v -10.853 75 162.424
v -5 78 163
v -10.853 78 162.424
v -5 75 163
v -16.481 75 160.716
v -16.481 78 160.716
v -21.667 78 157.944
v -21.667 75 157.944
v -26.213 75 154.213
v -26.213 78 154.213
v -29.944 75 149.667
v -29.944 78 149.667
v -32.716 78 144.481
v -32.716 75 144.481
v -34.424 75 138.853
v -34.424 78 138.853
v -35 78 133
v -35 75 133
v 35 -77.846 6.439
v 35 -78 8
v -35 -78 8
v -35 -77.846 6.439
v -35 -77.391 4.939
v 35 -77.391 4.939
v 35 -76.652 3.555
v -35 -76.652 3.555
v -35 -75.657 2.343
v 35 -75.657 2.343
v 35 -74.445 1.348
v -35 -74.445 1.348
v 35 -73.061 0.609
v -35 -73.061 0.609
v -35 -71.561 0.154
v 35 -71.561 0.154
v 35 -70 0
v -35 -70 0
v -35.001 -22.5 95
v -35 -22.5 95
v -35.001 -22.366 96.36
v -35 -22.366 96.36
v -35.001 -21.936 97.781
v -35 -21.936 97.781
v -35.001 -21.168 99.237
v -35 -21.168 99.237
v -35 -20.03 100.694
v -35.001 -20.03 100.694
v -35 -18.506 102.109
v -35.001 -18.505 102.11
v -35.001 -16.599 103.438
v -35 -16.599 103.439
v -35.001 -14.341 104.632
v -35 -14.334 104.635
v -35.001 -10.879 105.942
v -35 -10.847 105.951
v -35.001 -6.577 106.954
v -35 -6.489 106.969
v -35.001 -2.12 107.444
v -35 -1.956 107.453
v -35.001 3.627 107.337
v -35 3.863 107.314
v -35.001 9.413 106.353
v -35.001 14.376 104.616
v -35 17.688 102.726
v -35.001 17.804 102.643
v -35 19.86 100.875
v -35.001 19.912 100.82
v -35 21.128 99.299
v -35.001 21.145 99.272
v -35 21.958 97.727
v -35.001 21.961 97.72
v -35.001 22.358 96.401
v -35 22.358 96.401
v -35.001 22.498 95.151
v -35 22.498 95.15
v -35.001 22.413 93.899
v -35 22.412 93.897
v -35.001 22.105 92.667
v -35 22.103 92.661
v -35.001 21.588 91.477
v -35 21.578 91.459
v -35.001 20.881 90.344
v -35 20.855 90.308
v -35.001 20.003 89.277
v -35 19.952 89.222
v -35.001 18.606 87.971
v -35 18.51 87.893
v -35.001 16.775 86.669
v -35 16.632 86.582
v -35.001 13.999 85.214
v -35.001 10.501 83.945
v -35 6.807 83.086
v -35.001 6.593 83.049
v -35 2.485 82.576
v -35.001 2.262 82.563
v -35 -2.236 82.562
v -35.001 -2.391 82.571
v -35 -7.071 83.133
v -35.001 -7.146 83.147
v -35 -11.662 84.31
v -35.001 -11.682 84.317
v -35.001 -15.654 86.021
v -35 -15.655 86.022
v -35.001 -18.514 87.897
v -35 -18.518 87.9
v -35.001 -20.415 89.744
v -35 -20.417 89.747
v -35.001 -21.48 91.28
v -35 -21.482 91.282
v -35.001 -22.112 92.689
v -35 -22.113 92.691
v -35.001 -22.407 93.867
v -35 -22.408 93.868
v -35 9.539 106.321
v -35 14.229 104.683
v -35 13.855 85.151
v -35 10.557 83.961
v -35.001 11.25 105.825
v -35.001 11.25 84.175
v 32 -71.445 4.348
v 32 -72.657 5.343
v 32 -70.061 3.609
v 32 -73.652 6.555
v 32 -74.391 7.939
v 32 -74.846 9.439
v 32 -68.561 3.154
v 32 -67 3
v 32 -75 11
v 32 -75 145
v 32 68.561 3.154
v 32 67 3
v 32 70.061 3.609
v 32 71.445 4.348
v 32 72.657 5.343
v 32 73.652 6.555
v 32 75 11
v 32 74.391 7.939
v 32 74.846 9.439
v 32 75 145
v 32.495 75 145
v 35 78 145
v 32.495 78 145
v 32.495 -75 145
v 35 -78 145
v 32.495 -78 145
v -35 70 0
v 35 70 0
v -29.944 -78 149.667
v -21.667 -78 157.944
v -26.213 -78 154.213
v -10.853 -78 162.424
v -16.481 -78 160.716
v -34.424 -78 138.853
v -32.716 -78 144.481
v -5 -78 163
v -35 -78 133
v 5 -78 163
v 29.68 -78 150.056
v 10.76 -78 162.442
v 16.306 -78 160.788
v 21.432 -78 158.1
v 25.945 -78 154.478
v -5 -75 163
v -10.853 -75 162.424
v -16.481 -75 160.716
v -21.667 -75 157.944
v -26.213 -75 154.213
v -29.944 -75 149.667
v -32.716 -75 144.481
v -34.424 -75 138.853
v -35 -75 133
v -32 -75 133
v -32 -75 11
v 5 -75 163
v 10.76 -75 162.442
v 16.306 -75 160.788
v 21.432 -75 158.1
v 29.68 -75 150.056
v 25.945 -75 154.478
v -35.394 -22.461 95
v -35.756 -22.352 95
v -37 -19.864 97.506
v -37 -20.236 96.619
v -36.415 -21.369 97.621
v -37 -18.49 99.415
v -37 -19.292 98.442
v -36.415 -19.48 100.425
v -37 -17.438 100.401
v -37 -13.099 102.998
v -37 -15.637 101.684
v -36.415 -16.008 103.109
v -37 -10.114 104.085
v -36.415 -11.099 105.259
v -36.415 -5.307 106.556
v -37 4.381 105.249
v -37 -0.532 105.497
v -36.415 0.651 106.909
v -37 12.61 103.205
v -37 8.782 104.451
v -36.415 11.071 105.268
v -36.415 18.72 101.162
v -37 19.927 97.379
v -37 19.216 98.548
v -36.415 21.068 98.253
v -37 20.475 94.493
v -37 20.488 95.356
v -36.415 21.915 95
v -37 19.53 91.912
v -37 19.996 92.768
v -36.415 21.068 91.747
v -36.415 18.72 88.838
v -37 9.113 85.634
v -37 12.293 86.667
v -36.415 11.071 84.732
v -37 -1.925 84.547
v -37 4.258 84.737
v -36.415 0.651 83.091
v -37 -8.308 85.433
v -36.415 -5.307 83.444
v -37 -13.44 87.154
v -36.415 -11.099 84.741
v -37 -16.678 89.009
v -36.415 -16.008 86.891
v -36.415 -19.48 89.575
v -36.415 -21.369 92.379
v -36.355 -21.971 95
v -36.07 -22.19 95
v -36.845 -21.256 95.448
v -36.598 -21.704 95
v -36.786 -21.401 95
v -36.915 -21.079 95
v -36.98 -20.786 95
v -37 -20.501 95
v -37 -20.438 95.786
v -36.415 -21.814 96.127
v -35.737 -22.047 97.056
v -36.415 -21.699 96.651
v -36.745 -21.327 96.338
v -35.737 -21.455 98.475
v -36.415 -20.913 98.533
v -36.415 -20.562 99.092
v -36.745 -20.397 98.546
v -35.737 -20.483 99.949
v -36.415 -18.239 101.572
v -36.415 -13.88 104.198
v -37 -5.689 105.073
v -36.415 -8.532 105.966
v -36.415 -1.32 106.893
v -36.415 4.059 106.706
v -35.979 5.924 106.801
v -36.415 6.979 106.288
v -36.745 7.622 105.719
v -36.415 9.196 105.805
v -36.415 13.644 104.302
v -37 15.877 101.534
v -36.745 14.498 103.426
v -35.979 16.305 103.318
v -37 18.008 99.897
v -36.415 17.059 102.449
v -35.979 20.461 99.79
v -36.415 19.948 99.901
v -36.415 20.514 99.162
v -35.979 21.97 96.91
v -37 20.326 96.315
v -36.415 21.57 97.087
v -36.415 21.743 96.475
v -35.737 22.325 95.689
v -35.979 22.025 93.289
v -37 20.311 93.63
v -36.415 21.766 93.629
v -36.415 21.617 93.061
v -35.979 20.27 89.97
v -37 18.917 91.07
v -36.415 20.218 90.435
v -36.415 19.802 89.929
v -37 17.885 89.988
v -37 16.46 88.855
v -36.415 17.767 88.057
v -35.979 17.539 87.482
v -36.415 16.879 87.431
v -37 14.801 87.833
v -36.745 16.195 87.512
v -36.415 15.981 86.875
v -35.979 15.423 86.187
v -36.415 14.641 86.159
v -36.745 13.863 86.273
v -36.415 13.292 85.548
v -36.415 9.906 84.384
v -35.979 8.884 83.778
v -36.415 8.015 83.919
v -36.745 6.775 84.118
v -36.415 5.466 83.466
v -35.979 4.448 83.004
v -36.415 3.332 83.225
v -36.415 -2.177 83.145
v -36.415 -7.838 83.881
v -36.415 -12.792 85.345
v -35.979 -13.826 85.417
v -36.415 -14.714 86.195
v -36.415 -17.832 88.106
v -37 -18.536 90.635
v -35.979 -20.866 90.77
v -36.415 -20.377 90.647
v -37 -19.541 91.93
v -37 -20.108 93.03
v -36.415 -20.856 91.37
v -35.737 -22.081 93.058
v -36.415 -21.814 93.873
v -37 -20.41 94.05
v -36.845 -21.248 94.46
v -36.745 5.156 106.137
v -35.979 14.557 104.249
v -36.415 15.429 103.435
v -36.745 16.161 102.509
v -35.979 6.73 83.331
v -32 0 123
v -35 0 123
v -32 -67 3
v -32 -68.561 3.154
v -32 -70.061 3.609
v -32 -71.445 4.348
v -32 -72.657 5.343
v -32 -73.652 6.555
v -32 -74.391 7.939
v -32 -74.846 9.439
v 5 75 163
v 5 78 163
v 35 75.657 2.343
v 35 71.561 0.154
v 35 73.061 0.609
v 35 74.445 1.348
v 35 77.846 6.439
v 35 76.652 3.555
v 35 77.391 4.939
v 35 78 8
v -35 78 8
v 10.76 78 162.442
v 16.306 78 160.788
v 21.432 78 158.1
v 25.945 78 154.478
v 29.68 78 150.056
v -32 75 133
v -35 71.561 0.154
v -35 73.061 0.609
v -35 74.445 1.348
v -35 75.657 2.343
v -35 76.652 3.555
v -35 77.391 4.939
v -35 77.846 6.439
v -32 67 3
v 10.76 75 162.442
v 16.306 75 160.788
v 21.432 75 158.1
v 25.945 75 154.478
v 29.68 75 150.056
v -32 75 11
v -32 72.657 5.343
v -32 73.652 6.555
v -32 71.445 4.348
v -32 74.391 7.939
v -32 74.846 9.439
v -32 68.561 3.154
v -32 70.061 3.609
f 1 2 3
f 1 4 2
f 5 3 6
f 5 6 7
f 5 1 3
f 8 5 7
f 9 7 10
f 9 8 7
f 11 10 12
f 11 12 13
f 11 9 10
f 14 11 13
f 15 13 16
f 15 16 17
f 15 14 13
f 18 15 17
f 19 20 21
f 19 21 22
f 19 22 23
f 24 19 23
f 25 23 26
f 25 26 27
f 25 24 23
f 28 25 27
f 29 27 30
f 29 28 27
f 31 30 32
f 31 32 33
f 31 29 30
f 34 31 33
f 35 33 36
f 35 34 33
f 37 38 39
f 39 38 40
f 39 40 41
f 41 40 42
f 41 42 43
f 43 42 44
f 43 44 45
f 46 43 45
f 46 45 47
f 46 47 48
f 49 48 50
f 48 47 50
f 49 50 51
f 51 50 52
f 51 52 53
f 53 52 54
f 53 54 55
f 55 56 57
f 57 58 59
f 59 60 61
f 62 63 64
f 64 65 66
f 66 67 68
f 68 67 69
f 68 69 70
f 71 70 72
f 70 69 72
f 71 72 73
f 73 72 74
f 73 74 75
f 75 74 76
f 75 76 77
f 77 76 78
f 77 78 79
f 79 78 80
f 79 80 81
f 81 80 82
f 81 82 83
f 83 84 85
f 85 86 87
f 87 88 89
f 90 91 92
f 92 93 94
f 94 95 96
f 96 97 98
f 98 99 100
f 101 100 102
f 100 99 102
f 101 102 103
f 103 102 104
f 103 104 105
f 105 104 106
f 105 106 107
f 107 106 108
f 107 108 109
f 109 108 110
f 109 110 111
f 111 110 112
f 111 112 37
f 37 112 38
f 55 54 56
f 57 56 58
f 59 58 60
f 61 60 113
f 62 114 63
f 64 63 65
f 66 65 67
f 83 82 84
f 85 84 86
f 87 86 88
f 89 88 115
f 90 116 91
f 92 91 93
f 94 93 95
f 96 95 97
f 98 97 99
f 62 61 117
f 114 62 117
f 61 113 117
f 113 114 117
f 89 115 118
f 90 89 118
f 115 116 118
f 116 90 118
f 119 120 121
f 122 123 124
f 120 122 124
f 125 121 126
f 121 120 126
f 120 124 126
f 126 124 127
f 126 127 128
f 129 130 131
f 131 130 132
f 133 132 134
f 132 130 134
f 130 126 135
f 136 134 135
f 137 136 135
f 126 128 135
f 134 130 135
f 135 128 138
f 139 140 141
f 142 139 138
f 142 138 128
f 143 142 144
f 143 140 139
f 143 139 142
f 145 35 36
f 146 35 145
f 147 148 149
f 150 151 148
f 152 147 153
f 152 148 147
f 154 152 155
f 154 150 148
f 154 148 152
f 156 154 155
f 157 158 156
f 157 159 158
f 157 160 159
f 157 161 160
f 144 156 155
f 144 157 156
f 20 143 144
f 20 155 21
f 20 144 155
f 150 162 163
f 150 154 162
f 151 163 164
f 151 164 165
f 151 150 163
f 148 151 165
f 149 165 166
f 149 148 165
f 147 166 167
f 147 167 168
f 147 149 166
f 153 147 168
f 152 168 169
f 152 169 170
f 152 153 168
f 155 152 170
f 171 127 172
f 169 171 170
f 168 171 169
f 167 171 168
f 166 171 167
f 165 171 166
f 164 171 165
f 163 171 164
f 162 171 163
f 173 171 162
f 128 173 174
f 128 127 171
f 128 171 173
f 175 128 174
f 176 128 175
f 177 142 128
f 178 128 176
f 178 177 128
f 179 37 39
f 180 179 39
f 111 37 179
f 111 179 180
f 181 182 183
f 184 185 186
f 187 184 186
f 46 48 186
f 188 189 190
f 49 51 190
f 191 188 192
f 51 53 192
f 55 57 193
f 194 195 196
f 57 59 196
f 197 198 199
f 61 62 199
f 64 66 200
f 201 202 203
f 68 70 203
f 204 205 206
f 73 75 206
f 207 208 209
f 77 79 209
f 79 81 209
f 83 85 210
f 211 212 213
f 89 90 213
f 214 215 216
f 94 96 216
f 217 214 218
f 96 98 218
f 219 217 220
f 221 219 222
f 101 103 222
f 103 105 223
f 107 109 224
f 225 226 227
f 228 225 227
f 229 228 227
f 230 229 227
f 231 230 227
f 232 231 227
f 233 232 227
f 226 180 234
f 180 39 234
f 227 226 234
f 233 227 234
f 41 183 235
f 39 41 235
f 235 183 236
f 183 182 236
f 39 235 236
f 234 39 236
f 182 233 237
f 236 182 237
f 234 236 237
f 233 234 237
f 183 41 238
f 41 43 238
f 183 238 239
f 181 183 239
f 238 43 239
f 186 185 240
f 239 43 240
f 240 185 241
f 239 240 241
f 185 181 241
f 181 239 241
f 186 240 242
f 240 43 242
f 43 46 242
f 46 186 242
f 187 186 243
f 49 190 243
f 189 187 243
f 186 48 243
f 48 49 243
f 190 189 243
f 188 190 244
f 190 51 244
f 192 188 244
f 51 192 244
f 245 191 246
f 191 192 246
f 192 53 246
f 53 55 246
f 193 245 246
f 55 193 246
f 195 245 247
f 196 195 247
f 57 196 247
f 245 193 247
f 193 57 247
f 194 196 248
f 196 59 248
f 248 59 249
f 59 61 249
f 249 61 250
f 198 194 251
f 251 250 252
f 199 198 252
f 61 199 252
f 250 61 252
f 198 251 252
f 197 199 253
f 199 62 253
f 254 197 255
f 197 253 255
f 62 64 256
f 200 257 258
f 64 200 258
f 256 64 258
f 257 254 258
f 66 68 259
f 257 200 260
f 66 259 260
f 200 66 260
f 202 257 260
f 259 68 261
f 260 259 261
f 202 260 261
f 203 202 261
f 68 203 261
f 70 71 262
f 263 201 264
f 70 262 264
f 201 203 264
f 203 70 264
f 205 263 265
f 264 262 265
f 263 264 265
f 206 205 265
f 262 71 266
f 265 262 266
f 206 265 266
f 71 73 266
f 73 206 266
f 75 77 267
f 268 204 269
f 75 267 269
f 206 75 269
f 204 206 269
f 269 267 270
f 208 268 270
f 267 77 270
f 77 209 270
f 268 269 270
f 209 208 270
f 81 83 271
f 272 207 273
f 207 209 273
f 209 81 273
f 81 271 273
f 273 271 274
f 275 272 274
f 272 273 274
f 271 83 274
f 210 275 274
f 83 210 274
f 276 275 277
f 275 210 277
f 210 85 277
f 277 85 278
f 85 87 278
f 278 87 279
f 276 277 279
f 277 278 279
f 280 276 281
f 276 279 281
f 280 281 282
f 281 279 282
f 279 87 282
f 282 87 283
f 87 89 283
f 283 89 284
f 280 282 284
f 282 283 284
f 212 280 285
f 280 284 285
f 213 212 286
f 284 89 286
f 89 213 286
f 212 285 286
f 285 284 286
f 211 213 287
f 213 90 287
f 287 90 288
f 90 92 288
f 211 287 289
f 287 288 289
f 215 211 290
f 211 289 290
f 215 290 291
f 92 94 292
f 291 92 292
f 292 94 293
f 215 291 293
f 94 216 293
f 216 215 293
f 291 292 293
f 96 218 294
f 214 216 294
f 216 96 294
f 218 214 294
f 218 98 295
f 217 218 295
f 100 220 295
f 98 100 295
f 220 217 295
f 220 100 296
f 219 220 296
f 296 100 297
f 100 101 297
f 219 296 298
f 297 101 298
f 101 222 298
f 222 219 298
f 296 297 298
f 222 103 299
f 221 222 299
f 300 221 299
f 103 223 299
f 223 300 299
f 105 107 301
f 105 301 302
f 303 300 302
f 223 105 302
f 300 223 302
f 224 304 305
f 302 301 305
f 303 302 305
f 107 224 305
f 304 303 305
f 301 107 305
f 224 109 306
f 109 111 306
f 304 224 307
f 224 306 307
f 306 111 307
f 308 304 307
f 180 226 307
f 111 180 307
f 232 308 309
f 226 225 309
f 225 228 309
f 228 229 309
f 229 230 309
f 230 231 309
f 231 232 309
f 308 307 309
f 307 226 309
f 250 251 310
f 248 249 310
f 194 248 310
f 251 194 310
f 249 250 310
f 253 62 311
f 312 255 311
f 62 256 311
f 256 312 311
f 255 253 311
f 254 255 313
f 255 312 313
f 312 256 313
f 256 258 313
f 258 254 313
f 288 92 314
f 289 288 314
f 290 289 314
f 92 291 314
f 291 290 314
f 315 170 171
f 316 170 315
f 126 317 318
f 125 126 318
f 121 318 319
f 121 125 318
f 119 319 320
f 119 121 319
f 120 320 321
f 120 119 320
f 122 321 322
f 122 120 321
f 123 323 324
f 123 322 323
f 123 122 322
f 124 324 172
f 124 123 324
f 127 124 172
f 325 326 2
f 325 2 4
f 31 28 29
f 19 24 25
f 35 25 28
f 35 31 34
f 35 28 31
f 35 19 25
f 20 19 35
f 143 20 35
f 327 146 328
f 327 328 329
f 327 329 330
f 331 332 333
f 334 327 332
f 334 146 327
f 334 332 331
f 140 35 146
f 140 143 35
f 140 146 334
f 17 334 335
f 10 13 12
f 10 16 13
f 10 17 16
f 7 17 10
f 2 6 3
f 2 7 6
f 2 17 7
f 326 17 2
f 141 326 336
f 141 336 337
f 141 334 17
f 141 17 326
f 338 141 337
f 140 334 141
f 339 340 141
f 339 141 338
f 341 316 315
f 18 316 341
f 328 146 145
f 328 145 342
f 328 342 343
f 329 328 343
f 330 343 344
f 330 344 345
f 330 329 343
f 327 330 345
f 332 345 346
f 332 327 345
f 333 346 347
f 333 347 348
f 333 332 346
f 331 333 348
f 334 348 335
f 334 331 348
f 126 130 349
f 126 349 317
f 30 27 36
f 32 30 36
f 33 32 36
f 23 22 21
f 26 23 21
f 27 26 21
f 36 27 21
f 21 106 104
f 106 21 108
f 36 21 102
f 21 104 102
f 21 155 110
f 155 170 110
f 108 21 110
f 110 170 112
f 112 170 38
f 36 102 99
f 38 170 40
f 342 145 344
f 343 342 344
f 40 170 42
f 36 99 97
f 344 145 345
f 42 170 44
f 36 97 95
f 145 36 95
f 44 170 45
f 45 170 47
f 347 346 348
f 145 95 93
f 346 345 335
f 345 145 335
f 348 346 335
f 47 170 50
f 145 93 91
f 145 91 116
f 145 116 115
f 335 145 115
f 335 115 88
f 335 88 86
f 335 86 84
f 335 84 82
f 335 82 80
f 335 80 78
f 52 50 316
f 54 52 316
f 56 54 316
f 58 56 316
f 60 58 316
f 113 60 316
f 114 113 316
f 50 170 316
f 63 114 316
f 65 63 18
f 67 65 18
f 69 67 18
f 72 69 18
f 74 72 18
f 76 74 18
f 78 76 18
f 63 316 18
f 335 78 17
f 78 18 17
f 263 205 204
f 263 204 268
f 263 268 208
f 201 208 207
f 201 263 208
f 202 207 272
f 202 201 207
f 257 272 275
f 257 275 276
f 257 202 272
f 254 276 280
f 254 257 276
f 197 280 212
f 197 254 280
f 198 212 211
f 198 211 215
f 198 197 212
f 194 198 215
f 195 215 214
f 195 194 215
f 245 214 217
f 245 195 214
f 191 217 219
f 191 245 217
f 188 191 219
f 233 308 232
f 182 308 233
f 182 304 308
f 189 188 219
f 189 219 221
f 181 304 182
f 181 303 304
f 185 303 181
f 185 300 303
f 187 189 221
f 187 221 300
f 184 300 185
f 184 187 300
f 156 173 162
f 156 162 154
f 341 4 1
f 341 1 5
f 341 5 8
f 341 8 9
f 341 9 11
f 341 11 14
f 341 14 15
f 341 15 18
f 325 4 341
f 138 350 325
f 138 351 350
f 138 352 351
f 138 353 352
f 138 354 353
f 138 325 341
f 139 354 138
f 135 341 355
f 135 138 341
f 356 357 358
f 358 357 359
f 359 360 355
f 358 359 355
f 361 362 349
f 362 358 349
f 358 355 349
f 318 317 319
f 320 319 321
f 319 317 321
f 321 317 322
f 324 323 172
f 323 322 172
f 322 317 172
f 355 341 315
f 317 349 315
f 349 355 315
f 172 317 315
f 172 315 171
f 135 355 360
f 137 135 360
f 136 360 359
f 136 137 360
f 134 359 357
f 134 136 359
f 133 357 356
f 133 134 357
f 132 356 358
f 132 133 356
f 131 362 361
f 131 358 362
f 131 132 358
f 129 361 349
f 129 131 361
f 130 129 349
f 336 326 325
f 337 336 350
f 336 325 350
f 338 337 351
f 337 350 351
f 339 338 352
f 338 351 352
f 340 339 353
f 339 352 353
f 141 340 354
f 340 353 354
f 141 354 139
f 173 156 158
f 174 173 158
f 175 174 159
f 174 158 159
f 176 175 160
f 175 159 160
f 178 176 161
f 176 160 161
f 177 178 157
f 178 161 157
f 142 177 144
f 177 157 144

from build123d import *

# Parameters (mm, degrees)
F1_DEPTH  = 35
F2_R      = 30
F5_DEPTH  = 3
F8_DEPTH  = 3
F10_DEPTH = 2
F11_R     = 1.999


# Not quite as in the source:
# - a fillet or chamfer is up to 0.001 mm smaller than in the source, because OpenCascade refuses the exact size


with BuildPart() as f1:
    # F0 (on Right) → F1 (new body, symmetric)
    with BuildSketch(Plane.YZ):
        with BuildLine():
            Line((-75, 163), (-78, 163))
            Line((-78, 163), (-78, 8))
            ThreePointArc((-78, 8), (-75.6568542495, 2.3431457505), (-70, 0))
            Line((-70, 0), (0, 0))
            Line((0, 0), (0, 3))
            Line((0, 3), (-67, 3))
            ThreePointArc((-67, 3), (-72.6568542495, 5.3431457505), (-75, 11))
            Line((-75, 11), (-75, 163))
        make_face()
        with BuildLine():
            Line((0, 3), (0, 0))
            Line((0, 0), (70, 0))
            ThreePointArc((70, 0), (75.6568542495, 2.3431457505), (78, 8))
            Line((78, 8), (78, 163))
            Line((78, 163), (75, 163))
            Line((75, 163), (75, 11))
            ThreePointArc((75, 11), (72.6568542495, 5.3431457505), (67, 3))
            Line((67, 3), (0, 3))
        make_face()
    extrude(amount=F1_DEPTH, both=True)

    # F2
    f2_edges = [f1.edges().sort_by_distance(p)[0] for p in [
        (35, -76.5, 163),
        (35, 76.5, 163),
        (-35, 76.5, 163),
        (-35, -76.5, 163),
    ]]
    fillet(f2_edges, radius=F2_R)

    # F4 (on offset) → F5 (join)
    with BuildSketch(Plane(origin=(-35, 0, 0), x_dir=(0, -1, 0), z_dir=(-1, 0, 0))):
        with BuildLine():
            Line((-75, 133), (-78, 133))
            Line((-78, 133), (-78, 8))
            ThreePointArc((-78, 8), (-75.6568542495, 2.3431457505), (-70, 0))
            Line((-70, 0), (0, 0))
            Line((0, 0), (70, 0))
            ThreePointArc((70, 0), (75.6568542495, 2.3431457505), (78, 8))
            Line((78, 8), (78, 133))
            Line((78, 133), (75, 133))
            Line((75, 133), (0, 123))
            Line((0, 123), (-75, 133))
        make_face()
    extrude(amount=-F5_DEPTH)

    # F7 (on offset) → F8 (join)
    with BuildSketch(Plane.YZ.offset(35)):
        with BuildLine():
            Line((-78, 145), (-78, 8))
            ThreePointArc((-78, 8), (-75.6568542495, 2.3431457505), (-70, 0))
            Line((-70, 0), (0, 0))
            Line((0, 0), (70, 0))
            ThreePointArc((70, 0), (75.6568542495, 2.3431457505), (78, 8))
            Line((78, 8), (78, 145))
            Line((78, 145), (0, 145))
            Line((0, 145), (-78, 145))
        make_face()
    extrude(amount=-F8_DEPTH)

    # F9 (on offset) → F10 (join)
    with BuildSketch(Plane(origin=(-35, 0, 0), x_dir=(0, -1, 0), z_dir=(-1, 0, 0))):
        with BuildLine():
            add(Edge.make_bspline(
                [(22.5, 95), (22.5, 116.6506350946), (-11.25, 105.8253175473), (-45, 95), (-11.25, 84.1746824527), (22.5, 73.3493649054), (22.5, 95)],
                knots=[0, 0, 0, 2.0943951024, 2.0943951024, 4.1887902048, 4.1887902048, 6.2831853072, 6.2831853072, 6.2831853072], degree=2, weights=[1, 0.5, 1, 0.5, 1, 0.5, 1]))
        make_face()
    extrude(amount=F10_DEPTH)

    # F11 (radius 2 in the source; OpenCascade refuses exactly that, so slightly less here)
    f11_edges = [f1.edges().sort_by_distance(p)[0] for p in [
        (-37, 22.5, 95.000001),
    ]]
    fillet(f11_edges, radius=F11_R)


solid = f1.part
